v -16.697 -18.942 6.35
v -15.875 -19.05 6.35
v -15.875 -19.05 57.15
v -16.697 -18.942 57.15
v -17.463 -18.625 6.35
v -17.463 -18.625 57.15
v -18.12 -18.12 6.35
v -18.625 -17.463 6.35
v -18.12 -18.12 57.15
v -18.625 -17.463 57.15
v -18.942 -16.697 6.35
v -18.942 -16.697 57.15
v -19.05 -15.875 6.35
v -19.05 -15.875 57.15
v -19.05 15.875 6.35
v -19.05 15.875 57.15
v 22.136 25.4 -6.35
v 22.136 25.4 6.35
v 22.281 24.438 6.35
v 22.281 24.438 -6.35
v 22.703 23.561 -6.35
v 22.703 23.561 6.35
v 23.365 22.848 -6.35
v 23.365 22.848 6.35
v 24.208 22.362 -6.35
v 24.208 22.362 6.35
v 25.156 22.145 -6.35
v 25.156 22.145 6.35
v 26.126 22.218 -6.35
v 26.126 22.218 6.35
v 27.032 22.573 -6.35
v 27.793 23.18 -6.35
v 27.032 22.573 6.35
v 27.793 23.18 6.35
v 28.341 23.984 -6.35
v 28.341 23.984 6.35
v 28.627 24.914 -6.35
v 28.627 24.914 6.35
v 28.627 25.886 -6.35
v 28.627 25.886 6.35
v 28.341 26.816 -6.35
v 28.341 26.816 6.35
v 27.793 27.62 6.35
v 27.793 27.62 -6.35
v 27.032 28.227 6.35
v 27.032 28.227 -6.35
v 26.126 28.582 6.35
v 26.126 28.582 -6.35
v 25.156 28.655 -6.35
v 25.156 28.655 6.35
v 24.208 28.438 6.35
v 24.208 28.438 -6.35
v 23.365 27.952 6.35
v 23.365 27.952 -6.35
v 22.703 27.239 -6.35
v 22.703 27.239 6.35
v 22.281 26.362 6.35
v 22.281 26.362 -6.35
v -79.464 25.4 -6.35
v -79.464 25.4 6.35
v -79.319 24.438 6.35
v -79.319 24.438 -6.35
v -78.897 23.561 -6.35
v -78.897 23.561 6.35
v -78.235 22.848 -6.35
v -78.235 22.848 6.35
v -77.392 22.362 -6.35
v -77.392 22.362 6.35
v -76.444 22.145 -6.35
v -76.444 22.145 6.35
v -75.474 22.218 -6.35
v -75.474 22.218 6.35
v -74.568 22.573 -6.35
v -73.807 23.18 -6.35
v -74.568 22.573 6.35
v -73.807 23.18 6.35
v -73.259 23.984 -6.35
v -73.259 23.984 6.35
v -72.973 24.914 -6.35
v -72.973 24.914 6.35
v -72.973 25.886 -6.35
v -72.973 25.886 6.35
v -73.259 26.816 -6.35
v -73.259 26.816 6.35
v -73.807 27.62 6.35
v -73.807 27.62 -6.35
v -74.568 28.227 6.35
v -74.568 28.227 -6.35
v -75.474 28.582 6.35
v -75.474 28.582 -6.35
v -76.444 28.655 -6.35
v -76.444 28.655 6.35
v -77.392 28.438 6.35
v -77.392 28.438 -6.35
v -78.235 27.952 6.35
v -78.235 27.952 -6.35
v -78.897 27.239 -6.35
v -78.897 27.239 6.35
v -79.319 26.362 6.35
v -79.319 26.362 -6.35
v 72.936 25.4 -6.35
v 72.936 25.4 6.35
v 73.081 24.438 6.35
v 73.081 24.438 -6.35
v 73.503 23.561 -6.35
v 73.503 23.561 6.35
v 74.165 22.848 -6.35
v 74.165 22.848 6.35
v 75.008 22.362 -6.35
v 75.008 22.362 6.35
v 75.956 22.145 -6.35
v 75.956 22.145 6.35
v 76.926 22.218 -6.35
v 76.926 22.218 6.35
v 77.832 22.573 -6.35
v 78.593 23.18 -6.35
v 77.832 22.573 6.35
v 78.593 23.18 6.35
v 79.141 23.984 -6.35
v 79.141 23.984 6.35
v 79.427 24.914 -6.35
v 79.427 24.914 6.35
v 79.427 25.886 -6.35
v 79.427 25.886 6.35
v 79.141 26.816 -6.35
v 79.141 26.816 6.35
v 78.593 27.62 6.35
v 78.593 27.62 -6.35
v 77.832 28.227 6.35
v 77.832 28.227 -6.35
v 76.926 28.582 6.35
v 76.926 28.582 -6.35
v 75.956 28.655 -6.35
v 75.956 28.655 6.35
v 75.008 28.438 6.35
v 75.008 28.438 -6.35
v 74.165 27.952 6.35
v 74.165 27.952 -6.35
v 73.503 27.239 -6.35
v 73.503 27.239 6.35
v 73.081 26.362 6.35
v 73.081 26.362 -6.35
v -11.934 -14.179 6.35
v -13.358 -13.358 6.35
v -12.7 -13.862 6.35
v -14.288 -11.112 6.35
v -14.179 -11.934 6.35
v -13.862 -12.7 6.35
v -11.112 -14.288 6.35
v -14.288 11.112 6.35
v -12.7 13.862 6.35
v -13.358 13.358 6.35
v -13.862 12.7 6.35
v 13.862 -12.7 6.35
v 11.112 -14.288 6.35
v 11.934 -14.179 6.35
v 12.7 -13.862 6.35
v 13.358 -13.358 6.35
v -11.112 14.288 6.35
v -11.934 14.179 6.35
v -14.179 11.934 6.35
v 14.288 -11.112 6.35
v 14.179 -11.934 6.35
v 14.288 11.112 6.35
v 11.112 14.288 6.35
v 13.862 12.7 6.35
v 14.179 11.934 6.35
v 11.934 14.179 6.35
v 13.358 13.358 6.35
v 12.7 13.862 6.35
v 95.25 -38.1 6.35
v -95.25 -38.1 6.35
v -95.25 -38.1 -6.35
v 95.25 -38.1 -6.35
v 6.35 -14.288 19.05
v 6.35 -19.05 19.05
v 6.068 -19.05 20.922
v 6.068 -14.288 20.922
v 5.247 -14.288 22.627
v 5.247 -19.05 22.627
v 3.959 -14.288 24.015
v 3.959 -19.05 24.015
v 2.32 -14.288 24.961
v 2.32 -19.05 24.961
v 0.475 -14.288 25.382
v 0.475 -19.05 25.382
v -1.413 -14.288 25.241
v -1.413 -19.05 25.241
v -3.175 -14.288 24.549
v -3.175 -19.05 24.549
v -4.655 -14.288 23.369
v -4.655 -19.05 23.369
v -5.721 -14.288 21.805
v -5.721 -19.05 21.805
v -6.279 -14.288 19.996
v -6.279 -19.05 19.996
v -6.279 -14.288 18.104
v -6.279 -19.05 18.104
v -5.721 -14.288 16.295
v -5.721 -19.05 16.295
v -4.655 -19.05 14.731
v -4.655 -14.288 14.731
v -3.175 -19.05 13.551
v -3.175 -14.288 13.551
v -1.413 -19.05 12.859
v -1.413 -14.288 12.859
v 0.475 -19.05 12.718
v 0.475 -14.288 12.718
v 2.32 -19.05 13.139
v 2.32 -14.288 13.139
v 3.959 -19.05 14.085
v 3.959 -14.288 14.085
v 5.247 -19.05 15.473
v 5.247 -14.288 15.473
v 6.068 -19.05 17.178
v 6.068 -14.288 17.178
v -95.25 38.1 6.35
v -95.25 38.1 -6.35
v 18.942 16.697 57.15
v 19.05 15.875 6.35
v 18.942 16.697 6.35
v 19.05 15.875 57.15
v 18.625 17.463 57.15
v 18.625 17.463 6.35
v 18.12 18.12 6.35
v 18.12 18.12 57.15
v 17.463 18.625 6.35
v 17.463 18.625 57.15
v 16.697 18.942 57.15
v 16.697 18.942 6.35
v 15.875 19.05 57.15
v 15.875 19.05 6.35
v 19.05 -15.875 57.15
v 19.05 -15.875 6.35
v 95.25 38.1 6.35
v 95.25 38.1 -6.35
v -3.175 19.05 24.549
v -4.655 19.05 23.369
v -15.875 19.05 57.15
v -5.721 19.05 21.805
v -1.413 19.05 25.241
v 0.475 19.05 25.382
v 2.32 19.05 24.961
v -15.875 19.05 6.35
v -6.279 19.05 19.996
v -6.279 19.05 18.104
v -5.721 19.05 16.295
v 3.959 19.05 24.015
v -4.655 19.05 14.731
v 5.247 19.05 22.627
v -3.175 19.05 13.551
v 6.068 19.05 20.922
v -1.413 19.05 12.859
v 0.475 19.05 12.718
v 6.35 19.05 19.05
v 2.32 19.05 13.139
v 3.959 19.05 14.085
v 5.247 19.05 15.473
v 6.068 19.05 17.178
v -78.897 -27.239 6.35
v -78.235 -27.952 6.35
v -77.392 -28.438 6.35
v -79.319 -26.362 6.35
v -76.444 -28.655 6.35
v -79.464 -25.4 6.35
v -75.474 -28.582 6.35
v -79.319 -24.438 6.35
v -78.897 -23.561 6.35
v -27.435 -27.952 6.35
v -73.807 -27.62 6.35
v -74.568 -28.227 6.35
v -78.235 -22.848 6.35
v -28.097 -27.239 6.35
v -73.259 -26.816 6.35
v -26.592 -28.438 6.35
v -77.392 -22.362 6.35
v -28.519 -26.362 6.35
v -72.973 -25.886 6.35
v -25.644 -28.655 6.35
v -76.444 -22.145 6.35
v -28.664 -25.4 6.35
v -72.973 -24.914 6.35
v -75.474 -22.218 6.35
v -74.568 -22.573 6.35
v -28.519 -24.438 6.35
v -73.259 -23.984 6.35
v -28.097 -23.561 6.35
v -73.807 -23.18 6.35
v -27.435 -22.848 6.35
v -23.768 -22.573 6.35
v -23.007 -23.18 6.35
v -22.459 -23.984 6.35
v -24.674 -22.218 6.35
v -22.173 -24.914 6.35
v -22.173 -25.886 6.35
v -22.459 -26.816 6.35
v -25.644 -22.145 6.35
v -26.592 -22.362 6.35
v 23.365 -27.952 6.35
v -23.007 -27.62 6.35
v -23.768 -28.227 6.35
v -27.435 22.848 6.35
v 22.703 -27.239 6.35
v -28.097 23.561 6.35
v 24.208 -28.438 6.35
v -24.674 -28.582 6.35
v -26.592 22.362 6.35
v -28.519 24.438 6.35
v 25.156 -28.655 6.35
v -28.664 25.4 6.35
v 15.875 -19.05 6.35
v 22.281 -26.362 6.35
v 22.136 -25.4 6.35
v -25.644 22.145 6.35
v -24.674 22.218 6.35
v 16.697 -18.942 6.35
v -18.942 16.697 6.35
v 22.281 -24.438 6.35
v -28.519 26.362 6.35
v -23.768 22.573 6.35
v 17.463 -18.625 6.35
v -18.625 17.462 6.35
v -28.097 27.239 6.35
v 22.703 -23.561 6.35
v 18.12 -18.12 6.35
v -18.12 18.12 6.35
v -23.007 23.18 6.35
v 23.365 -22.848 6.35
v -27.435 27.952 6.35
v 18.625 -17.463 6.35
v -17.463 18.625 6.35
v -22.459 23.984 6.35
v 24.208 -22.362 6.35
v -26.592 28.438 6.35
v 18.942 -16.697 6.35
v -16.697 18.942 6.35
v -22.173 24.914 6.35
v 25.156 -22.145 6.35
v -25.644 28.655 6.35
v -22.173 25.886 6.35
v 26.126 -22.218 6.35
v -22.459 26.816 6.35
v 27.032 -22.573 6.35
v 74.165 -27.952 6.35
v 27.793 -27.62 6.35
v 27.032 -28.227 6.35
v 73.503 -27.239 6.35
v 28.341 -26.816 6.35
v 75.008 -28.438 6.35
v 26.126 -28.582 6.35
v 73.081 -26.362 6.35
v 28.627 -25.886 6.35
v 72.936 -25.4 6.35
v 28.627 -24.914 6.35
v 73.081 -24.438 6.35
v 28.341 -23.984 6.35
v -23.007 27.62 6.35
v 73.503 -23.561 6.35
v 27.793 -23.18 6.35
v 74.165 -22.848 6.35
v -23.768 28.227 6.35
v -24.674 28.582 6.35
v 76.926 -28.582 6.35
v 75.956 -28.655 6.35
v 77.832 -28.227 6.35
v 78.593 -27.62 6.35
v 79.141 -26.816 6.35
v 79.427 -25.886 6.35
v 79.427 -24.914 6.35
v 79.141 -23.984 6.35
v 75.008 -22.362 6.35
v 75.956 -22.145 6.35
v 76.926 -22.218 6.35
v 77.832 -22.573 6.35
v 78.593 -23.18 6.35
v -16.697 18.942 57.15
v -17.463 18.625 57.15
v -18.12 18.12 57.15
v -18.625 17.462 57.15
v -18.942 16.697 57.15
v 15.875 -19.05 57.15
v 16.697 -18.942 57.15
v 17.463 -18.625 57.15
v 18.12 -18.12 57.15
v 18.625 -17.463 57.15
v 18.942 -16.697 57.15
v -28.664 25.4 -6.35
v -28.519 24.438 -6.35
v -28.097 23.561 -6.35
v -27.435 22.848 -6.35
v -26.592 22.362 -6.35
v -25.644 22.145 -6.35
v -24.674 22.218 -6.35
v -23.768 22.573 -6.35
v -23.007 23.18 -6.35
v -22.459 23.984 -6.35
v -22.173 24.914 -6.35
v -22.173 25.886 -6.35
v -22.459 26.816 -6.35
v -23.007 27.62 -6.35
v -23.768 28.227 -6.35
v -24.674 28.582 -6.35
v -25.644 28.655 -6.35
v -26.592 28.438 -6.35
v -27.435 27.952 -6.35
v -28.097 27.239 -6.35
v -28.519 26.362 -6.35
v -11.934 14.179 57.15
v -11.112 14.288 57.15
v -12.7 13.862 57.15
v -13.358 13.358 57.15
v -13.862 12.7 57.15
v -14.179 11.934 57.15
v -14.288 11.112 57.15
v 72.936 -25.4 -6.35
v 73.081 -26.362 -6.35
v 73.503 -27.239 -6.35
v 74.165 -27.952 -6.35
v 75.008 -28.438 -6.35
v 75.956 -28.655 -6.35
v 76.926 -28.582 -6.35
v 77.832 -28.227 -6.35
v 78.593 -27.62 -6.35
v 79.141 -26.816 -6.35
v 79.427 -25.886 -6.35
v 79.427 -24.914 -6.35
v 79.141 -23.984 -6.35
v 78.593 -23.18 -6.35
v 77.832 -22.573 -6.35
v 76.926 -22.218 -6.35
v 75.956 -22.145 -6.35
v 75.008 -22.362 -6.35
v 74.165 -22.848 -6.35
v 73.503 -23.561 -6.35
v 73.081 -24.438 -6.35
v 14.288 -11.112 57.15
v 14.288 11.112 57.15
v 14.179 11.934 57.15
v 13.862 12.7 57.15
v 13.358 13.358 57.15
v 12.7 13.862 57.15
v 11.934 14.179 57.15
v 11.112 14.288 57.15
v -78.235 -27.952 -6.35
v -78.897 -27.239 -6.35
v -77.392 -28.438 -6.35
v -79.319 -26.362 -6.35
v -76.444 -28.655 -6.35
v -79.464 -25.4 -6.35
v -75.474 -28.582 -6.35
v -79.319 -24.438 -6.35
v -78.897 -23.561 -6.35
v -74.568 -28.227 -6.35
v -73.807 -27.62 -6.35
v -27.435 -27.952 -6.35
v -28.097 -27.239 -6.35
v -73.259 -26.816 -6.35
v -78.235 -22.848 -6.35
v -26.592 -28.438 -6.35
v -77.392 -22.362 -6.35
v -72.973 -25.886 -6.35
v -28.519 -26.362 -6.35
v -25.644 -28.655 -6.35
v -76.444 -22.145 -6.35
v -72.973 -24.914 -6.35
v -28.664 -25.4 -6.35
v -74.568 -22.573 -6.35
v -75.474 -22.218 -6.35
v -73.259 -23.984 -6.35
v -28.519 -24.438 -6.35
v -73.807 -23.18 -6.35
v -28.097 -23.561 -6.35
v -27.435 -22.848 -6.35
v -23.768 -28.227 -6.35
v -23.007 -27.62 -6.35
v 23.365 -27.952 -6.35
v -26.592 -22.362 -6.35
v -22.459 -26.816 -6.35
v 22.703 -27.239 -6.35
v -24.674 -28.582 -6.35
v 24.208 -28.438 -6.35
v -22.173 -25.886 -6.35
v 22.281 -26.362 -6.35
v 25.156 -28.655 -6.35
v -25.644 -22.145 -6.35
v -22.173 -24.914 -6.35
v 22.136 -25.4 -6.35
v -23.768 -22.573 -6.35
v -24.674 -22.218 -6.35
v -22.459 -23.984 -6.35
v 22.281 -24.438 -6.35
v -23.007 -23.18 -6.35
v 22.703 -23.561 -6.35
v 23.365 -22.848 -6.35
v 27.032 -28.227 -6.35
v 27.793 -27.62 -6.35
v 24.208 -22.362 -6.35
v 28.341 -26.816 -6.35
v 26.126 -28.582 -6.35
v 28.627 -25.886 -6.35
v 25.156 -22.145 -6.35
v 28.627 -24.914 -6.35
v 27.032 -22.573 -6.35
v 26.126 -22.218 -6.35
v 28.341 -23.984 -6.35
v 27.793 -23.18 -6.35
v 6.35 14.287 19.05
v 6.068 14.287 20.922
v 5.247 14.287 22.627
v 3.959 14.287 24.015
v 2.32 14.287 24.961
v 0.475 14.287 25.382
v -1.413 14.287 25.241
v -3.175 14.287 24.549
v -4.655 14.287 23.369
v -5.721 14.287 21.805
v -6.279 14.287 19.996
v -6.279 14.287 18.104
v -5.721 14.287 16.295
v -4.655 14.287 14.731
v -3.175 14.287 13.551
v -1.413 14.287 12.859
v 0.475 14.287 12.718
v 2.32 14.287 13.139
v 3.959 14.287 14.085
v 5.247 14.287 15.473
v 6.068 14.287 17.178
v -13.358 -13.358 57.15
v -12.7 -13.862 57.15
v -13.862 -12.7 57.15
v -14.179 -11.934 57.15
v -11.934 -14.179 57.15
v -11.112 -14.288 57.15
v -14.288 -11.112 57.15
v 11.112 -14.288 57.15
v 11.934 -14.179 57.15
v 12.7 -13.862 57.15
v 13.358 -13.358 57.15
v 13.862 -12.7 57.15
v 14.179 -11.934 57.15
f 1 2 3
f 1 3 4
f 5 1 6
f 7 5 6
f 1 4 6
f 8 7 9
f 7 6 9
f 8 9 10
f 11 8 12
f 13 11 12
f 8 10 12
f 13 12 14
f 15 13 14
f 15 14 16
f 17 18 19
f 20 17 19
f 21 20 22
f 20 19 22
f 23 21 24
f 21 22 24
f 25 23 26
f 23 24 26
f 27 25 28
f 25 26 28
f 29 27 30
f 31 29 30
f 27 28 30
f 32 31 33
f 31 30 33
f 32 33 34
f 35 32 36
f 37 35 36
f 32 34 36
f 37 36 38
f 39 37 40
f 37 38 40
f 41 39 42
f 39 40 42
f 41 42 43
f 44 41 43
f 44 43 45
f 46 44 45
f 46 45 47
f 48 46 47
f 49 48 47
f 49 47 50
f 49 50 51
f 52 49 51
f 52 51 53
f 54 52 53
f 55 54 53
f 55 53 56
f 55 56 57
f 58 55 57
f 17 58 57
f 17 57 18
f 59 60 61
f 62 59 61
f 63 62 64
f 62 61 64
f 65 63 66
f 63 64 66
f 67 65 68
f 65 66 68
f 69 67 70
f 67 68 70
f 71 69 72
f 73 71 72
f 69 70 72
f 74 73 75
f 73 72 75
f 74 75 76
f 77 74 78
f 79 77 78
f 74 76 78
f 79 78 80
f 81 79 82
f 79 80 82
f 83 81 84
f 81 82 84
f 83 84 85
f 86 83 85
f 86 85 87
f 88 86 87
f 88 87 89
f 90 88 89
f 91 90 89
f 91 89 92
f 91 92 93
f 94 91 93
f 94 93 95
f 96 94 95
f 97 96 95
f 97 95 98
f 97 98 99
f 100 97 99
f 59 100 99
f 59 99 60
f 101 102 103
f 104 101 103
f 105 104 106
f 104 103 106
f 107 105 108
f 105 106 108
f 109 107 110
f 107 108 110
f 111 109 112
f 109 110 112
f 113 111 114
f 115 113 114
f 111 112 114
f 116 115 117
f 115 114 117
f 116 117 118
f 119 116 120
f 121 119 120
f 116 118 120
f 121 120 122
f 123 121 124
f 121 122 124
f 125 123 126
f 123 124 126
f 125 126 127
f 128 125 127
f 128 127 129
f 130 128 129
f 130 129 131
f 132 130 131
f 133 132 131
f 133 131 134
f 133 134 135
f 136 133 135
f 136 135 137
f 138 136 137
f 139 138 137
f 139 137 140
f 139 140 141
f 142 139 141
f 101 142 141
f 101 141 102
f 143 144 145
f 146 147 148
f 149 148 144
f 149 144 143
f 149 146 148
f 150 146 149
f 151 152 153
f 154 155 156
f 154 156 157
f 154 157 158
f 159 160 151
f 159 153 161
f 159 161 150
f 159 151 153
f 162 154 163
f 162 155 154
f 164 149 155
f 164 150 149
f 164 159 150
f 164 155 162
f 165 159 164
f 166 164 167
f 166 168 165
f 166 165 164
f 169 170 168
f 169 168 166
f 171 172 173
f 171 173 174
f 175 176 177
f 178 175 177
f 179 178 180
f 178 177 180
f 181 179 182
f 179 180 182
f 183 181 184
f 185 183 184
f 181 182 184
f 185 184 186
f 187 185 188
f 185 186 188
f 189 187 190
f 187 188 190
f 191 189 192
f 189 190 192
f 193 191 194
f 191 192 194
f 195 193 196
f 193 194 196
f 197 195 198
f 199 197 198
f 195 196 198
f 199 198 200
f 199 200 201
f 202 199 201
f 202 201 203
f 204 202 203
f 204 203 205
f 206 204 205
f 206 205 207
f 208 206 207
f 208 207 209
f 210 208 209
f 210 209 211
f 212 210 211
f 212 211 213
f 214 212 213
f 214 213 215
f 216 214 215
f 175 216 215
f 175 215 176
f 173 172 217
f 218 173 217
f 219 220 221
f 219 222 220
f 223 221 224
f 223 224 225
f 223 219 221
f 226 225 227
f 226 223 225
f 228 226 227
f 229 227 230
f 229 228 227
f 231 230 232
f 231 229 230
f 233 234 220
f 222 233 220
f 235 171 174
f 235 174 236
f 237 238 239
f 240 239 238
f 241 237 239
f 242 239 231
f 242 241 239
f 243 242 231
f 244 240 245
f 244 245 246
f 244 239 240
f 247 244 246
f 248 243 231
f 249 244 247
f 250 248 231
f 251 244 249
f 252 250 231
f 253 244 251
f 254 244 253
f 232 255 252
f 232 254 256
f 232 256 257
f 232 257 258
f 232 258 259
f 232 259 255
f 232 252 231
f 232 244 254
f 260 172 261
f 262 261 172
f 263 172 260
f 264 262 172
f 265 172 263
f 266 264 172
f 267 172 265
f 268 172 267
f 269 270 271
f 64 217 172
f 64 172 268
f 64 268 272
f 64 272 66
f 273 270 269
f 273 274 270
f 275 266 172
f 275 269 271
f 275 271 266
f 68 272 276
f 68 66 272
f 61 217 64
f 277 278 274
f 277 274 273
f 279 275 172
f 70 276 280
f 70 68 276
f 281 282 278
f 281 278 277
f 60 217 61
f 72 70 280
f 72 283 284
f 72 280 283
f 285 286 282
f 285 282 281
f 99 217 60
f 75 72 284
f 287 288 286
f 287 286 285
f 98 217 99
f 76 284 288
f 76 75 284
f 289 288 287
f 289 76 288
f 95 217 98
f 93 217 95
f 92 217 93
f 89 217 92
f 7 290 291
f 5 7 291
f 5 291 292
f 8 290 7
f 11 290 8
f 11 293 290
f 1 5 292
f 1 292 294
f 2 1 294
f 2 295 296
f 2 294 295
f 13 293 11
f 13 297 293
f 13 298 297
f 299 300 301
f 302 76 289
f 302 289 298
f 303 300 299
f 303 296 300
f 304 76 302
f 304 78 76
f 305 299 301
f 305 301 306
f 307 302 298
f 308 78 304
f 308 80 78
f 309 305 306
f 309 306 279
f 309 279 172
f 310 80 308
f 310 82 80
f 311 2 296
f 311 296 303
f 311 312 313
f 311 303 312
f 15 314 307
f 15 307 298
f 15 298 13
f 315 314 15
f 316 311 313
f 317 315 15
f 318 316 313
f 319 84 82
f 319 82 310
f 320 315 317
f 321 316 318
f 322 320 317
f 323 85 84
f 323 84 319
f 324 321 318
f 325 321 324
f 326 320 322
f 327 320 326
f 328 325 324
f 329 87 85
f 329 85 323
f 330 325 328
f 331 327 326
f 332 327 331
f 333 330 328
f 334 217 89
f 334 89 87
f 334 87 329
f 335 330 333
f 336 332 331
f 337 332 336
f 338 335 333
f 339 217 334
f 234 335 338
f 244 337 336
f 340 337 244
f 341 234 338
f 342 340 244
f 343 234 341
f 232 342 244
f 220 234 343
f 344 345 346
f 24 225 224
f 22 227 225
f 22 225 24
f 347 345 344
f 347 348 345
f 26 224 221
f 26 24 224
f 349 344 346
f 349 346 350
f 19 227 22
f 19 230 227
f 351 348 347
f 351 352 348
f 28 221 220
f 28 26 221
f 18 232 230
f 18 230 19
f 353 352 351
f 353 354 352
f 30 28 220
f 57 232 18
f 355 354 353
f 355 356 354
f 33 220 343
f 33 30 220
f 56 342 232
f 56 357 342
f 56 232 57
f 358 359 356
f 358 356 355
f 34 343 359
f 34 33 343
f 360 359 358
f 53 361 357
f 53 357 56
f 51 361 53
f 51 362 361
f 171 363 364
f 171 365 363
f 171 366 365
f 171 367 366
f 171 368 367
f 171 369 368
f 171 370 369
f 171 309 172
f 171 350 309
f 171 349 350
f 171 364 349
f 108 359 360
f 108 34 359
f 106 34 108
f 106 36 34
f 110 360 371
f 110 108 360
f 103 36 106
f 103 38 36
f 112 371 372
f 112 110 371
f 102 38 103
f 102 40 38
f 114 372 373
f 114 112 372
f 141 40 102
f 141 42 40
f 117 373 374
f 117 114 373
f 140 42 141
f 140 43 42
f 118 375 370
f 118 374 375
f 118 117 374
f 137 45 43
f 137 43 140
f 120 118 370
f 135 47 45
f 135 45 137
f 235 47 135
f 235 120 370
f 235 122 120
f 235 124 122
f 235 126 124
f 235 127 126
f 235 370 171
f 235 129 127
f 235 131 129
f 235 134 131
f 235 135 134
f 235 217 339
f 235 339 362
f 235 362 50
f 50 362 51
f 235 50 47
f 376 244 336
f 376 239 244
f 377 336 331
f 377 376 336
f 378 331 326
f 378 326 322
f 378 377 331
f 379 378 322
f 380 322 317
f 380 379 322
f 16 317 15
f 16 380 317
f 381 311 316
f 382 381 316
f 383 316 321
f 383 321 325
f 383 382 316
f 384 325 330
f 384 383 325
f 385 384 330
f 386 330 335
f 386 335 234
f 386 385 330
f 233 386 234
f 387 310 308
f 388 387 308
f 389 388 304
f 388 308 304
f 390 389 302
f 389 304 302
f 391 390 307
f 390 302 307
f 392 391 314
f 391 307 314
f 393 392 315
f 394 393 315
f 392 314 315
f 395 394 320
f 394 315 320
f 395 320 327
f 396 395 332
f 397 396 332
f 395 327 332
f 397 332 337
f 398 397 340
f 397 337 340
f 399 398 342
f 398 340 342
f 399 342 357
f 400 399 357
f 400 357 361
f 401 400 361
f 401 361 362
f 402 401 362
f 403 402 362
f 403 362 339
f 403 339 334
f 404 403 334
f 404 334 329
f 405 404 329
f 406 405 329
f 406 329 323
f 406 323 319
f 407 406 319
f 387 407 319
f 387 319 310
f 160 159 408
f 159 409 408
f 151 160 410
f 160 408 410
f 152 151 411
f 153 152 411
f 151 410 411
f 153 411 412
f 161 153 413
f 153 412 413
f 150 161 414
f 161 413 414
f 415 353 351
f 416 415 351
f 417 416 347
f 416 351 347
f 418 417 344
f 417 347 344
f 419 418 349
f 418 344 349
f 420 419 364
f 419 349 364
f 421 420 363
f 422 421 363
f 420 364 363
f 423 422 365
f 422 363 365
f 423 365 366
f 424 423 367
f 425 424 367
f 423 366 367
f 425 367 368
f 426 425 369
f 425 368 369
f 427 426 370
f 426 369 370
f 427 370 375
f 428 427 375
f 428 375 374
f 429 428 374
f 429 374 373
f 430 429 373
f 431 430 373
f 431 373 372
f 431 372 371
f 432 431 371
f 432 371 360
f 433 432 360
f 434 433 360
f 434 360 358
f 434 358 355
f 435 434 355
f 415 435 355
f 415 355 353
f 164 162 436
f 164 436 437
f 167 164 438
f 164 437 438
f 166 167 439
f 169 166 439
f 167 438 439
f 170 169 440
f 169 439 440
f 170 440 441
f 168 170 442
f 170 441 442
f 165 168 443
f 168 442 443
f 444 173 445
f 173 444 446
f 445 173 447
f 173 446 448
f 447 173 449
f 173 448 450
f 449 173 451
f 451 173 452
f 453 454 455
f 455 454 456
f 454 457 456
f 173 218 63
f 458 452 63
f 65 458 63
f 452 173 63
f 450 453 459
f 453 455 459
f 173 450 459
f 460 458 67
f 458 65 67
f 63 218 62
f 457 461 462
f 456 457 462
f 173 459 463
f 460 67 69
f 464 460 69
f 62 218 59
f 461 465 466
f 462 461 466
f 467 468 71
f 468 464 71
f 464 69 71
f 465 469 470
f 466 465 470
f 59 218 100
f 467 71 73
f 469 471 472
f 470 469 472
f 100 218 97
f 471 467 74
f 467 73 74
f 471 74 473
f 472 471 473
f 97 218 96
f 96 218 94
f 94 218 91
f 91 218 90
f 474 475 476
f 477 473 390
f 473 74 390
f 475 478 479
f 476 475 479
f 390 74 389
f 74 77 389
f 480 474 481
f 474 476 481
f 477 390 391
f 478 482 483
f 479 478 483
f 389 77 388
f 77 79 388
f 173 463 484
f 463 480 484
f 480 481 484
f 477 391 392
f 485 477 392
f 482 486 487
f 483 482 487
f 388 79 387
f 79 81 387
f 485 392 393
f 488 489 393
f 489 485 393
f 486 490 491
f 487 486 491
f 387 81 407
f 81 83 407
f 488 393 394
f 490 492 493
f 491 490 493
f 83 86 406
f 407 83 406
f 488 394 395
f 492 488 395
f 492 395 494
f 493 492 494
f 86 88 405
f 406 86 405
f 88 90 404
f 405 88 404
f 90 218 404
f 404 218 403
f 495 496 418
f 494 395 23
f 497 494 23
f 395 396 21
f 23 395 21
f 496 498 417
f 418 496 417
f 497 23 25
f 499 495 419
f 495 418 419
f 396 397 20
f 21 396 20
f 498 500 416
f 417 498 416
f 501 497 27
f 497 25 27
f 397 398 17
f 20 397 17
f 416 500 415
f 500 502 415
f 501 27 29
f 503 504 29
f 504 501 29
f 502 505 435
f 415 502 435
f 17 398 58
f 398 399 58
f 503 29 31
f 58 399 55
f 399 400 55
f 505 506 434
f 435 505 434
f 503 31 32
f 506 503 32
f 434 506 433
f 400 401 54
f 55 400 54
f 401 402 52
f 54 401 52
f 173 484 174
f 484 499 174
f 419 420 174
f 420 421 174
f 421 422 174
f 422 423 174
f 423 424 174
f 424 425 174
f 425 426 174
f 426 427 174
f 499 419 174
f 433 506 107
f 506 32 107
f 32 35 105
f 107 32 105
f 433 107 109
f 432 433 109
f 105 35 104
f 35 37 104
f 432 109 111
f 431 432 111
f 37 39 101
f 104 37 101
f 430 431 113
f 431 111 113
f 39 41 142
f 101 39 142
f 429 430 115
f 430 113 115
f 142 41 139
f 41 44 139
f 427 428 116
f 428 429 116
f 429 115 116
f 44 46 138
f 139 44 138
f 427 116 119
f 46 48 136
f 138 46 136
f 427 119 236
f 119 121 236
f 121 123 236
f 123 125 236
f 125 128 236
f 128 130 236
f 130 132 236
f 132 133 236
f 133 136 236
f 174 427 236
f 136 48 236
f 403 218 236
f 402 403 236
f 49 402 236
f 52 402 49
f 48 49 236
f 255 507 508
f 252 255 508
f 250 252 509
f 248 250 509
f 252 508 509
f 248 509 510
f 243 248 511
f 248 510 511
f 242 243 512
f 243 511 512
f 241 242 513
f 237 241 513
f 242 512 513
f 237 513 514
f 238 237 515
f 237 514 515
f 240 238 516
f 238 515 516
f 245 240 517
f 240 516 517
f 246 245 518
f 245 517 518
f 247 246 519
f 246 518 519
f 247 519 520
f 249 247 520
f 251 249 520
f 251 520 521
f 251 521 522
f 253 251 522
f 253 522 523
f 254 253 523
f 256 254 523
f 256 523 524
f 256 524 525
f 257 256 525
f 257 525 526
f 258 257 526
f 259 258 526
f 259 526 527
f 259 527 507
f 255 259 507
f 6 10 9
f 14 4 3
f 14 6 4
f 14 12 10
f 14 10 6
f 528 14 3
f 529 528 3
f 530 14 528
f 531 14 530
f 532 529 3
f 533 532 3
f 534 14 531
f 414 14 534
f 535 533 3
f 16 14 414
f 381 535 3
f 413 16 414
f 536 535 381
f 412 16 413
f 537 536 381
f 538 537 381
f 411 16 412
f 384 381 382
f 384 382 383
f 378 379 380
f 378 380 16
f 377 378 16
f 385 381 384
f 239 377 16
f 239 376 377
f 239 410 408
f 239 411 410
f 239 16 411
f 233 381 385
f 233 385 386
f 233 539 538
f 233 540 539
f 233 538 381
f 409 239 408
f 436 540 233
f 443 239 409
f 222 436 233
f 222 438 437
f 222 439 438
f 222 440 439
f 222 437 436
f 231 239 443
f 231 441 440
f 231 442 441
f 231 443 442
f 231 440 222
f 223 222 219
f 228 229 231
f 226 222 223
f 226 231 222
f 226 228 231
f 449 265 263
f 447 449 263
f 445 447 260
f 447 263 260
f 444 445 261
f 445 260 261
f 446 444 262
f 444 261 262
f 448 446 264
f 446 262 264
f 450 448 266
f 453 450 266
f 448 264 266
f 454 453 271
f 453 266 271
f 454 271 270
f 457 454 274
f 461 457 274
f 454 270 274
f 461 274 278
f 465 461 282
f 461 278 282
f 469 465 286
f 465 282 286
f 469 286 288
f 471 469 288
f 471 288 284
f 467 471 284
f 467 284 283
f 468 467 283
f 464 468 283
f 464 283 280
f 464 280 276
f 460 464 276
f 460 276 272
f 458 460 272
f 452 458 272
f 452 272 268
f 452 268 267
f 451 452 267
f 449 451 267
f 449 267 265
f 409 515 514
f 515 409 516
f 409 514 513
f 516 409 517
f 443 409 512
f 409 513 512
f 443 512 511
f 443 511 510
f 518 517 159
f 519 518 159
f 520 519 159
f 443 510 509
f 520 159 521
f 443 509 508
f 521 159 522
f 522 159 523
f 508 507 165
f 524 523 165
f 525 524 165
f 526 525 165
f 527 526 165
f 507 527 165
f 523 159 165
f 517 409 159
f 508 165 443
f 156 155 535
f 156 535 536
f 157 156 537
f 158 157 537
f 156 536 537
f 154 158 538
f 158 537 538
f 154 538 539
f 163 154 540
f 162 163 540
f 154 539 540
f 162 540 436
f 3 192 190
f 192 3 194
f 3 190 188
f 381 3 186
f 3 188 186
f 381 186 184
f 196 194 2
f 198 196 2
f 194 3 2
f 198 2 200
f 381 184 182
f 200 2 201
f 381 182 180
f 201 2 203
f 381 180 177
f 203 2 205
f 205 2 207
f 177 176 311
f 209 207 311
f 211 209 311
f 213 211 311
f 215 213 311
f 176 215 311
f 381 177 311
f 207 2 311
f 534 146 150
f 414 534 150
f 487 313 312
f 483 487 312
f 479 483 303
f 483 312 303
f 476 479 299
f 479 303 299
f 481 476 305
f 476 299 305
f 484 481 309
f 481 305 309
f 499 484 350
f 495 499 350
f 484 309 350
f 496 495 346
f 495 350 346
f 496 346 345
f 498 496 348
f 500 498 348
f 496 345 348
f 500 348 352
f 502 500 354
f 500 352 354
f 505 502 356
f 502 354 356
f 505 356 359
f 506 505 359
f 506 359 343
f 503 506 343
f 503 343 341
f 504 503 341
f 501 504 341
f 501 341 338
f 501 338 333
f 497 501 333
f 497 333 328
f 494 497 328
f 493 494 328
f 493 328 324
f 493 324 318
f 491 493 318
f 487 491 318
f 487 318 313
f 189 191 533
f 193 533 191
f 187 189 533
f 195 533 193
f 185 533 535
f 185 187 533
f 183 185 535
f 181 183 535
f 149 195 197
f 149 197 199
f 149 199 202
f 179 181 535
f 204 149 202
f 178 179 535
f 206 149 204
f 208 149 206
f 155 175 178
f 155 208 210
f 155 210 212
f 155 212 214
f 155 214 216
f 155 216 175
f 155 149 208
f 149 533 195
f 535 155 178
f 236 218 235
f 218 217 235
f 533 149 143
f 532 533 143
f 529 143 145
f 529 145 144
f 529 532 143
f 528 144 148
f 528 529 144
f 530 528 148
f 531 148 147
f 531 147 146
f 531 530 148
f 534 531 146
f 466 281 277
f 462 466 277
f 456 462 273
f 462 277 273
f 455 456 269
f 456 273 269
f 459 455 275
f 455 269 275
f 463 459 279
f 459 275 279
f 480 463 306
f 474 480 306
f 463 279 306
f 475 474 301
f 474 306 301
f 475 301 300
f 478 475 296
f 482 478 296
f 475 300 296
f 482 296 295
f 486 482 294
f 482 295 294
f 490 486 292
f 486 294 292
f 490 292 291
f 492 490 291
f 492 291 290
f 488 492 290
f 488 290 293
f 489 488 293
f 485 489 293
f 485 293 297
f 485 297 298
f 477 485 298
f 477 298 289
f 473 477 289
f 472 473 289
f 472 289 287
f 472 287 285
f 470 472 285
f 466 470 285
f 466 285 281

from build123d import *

# Parameters (mm, degrees)
F0_W     = 190.5
F0_H     = 76.2
F1_DEPTH = 6.35
F3_D     = 6.5278
F4_W     = 38.1
F4_H     = 38.1
F4_W_2   = 28.575
F4_H_2   = 28.575
F5_DEPTH = 50.8
F6_R     = 3.175
F7_R     = 6.35
F8_DEPTH = 38.1


# Not quite as in the source:
# - a feature names something its author has since deleted; it is built from what else it names


with BuildPart() as f1:
    # F0 (on Top) → F1 (new body, symmetric)
    with BuildSketch(Plane.XY):
        Rectangle(F0_W, F0_H)
    extrude(amount=F1_DEPTH, both=True)

    # F3 (through all)
    with Locations(Plane(origin=(0, 0, -6.35), x_dir=(1, 0, 0), z_dir=(0, 0, -1))):
        with Locations((-76.2, -25.4), (-25.4, -25.4), (-76.2, 25.4), (-25.4, 25.4), (25.4, 25.4), (25.4, -25.4), (76.2, -25.4), (76.2, 25.4)):
            Hole(F3_D / 2)

    # F4 (on face) → F5 (join)
    with BuildSketch(Plane.XY.offset(6.35)):
        Rectangle(F4_W, F4_H)
        Rectangle(F4_W_2, F4_H_2, mode=Mode.SUBTRACT)
    extrude(amount=F5_DEPTH)

    # F6
    f6_edges = [f1.edges().sort_by_distance(p)[0] for p in [
        (-19.05, -19.05, 31.75),
        (19.05, -19.05, 31.75),
        (-14.2875, 14.2875, 31.75),
        (14.2875, 14.2875, 31.75),
        (-14.2875, -14.2875, 31.75),
        (14.2875, -14.2875, 31.75),
        (-19.05, 19.05, 31.75),
        (19.05, 19.05, 31.75),
    ]]
    fillet(f6_edges, radius=F6_R)

    # F7 (on face) → F8 (cut, through all)
    with BuildSketch(Plane.XZ.offset(19.05)):
        with Locations((0, 19.05)):
            Circle(F7_R)
    extrude(amount=-F8_DEPTH, mode=Mode.SUBTRACT)


solid = f1.part
